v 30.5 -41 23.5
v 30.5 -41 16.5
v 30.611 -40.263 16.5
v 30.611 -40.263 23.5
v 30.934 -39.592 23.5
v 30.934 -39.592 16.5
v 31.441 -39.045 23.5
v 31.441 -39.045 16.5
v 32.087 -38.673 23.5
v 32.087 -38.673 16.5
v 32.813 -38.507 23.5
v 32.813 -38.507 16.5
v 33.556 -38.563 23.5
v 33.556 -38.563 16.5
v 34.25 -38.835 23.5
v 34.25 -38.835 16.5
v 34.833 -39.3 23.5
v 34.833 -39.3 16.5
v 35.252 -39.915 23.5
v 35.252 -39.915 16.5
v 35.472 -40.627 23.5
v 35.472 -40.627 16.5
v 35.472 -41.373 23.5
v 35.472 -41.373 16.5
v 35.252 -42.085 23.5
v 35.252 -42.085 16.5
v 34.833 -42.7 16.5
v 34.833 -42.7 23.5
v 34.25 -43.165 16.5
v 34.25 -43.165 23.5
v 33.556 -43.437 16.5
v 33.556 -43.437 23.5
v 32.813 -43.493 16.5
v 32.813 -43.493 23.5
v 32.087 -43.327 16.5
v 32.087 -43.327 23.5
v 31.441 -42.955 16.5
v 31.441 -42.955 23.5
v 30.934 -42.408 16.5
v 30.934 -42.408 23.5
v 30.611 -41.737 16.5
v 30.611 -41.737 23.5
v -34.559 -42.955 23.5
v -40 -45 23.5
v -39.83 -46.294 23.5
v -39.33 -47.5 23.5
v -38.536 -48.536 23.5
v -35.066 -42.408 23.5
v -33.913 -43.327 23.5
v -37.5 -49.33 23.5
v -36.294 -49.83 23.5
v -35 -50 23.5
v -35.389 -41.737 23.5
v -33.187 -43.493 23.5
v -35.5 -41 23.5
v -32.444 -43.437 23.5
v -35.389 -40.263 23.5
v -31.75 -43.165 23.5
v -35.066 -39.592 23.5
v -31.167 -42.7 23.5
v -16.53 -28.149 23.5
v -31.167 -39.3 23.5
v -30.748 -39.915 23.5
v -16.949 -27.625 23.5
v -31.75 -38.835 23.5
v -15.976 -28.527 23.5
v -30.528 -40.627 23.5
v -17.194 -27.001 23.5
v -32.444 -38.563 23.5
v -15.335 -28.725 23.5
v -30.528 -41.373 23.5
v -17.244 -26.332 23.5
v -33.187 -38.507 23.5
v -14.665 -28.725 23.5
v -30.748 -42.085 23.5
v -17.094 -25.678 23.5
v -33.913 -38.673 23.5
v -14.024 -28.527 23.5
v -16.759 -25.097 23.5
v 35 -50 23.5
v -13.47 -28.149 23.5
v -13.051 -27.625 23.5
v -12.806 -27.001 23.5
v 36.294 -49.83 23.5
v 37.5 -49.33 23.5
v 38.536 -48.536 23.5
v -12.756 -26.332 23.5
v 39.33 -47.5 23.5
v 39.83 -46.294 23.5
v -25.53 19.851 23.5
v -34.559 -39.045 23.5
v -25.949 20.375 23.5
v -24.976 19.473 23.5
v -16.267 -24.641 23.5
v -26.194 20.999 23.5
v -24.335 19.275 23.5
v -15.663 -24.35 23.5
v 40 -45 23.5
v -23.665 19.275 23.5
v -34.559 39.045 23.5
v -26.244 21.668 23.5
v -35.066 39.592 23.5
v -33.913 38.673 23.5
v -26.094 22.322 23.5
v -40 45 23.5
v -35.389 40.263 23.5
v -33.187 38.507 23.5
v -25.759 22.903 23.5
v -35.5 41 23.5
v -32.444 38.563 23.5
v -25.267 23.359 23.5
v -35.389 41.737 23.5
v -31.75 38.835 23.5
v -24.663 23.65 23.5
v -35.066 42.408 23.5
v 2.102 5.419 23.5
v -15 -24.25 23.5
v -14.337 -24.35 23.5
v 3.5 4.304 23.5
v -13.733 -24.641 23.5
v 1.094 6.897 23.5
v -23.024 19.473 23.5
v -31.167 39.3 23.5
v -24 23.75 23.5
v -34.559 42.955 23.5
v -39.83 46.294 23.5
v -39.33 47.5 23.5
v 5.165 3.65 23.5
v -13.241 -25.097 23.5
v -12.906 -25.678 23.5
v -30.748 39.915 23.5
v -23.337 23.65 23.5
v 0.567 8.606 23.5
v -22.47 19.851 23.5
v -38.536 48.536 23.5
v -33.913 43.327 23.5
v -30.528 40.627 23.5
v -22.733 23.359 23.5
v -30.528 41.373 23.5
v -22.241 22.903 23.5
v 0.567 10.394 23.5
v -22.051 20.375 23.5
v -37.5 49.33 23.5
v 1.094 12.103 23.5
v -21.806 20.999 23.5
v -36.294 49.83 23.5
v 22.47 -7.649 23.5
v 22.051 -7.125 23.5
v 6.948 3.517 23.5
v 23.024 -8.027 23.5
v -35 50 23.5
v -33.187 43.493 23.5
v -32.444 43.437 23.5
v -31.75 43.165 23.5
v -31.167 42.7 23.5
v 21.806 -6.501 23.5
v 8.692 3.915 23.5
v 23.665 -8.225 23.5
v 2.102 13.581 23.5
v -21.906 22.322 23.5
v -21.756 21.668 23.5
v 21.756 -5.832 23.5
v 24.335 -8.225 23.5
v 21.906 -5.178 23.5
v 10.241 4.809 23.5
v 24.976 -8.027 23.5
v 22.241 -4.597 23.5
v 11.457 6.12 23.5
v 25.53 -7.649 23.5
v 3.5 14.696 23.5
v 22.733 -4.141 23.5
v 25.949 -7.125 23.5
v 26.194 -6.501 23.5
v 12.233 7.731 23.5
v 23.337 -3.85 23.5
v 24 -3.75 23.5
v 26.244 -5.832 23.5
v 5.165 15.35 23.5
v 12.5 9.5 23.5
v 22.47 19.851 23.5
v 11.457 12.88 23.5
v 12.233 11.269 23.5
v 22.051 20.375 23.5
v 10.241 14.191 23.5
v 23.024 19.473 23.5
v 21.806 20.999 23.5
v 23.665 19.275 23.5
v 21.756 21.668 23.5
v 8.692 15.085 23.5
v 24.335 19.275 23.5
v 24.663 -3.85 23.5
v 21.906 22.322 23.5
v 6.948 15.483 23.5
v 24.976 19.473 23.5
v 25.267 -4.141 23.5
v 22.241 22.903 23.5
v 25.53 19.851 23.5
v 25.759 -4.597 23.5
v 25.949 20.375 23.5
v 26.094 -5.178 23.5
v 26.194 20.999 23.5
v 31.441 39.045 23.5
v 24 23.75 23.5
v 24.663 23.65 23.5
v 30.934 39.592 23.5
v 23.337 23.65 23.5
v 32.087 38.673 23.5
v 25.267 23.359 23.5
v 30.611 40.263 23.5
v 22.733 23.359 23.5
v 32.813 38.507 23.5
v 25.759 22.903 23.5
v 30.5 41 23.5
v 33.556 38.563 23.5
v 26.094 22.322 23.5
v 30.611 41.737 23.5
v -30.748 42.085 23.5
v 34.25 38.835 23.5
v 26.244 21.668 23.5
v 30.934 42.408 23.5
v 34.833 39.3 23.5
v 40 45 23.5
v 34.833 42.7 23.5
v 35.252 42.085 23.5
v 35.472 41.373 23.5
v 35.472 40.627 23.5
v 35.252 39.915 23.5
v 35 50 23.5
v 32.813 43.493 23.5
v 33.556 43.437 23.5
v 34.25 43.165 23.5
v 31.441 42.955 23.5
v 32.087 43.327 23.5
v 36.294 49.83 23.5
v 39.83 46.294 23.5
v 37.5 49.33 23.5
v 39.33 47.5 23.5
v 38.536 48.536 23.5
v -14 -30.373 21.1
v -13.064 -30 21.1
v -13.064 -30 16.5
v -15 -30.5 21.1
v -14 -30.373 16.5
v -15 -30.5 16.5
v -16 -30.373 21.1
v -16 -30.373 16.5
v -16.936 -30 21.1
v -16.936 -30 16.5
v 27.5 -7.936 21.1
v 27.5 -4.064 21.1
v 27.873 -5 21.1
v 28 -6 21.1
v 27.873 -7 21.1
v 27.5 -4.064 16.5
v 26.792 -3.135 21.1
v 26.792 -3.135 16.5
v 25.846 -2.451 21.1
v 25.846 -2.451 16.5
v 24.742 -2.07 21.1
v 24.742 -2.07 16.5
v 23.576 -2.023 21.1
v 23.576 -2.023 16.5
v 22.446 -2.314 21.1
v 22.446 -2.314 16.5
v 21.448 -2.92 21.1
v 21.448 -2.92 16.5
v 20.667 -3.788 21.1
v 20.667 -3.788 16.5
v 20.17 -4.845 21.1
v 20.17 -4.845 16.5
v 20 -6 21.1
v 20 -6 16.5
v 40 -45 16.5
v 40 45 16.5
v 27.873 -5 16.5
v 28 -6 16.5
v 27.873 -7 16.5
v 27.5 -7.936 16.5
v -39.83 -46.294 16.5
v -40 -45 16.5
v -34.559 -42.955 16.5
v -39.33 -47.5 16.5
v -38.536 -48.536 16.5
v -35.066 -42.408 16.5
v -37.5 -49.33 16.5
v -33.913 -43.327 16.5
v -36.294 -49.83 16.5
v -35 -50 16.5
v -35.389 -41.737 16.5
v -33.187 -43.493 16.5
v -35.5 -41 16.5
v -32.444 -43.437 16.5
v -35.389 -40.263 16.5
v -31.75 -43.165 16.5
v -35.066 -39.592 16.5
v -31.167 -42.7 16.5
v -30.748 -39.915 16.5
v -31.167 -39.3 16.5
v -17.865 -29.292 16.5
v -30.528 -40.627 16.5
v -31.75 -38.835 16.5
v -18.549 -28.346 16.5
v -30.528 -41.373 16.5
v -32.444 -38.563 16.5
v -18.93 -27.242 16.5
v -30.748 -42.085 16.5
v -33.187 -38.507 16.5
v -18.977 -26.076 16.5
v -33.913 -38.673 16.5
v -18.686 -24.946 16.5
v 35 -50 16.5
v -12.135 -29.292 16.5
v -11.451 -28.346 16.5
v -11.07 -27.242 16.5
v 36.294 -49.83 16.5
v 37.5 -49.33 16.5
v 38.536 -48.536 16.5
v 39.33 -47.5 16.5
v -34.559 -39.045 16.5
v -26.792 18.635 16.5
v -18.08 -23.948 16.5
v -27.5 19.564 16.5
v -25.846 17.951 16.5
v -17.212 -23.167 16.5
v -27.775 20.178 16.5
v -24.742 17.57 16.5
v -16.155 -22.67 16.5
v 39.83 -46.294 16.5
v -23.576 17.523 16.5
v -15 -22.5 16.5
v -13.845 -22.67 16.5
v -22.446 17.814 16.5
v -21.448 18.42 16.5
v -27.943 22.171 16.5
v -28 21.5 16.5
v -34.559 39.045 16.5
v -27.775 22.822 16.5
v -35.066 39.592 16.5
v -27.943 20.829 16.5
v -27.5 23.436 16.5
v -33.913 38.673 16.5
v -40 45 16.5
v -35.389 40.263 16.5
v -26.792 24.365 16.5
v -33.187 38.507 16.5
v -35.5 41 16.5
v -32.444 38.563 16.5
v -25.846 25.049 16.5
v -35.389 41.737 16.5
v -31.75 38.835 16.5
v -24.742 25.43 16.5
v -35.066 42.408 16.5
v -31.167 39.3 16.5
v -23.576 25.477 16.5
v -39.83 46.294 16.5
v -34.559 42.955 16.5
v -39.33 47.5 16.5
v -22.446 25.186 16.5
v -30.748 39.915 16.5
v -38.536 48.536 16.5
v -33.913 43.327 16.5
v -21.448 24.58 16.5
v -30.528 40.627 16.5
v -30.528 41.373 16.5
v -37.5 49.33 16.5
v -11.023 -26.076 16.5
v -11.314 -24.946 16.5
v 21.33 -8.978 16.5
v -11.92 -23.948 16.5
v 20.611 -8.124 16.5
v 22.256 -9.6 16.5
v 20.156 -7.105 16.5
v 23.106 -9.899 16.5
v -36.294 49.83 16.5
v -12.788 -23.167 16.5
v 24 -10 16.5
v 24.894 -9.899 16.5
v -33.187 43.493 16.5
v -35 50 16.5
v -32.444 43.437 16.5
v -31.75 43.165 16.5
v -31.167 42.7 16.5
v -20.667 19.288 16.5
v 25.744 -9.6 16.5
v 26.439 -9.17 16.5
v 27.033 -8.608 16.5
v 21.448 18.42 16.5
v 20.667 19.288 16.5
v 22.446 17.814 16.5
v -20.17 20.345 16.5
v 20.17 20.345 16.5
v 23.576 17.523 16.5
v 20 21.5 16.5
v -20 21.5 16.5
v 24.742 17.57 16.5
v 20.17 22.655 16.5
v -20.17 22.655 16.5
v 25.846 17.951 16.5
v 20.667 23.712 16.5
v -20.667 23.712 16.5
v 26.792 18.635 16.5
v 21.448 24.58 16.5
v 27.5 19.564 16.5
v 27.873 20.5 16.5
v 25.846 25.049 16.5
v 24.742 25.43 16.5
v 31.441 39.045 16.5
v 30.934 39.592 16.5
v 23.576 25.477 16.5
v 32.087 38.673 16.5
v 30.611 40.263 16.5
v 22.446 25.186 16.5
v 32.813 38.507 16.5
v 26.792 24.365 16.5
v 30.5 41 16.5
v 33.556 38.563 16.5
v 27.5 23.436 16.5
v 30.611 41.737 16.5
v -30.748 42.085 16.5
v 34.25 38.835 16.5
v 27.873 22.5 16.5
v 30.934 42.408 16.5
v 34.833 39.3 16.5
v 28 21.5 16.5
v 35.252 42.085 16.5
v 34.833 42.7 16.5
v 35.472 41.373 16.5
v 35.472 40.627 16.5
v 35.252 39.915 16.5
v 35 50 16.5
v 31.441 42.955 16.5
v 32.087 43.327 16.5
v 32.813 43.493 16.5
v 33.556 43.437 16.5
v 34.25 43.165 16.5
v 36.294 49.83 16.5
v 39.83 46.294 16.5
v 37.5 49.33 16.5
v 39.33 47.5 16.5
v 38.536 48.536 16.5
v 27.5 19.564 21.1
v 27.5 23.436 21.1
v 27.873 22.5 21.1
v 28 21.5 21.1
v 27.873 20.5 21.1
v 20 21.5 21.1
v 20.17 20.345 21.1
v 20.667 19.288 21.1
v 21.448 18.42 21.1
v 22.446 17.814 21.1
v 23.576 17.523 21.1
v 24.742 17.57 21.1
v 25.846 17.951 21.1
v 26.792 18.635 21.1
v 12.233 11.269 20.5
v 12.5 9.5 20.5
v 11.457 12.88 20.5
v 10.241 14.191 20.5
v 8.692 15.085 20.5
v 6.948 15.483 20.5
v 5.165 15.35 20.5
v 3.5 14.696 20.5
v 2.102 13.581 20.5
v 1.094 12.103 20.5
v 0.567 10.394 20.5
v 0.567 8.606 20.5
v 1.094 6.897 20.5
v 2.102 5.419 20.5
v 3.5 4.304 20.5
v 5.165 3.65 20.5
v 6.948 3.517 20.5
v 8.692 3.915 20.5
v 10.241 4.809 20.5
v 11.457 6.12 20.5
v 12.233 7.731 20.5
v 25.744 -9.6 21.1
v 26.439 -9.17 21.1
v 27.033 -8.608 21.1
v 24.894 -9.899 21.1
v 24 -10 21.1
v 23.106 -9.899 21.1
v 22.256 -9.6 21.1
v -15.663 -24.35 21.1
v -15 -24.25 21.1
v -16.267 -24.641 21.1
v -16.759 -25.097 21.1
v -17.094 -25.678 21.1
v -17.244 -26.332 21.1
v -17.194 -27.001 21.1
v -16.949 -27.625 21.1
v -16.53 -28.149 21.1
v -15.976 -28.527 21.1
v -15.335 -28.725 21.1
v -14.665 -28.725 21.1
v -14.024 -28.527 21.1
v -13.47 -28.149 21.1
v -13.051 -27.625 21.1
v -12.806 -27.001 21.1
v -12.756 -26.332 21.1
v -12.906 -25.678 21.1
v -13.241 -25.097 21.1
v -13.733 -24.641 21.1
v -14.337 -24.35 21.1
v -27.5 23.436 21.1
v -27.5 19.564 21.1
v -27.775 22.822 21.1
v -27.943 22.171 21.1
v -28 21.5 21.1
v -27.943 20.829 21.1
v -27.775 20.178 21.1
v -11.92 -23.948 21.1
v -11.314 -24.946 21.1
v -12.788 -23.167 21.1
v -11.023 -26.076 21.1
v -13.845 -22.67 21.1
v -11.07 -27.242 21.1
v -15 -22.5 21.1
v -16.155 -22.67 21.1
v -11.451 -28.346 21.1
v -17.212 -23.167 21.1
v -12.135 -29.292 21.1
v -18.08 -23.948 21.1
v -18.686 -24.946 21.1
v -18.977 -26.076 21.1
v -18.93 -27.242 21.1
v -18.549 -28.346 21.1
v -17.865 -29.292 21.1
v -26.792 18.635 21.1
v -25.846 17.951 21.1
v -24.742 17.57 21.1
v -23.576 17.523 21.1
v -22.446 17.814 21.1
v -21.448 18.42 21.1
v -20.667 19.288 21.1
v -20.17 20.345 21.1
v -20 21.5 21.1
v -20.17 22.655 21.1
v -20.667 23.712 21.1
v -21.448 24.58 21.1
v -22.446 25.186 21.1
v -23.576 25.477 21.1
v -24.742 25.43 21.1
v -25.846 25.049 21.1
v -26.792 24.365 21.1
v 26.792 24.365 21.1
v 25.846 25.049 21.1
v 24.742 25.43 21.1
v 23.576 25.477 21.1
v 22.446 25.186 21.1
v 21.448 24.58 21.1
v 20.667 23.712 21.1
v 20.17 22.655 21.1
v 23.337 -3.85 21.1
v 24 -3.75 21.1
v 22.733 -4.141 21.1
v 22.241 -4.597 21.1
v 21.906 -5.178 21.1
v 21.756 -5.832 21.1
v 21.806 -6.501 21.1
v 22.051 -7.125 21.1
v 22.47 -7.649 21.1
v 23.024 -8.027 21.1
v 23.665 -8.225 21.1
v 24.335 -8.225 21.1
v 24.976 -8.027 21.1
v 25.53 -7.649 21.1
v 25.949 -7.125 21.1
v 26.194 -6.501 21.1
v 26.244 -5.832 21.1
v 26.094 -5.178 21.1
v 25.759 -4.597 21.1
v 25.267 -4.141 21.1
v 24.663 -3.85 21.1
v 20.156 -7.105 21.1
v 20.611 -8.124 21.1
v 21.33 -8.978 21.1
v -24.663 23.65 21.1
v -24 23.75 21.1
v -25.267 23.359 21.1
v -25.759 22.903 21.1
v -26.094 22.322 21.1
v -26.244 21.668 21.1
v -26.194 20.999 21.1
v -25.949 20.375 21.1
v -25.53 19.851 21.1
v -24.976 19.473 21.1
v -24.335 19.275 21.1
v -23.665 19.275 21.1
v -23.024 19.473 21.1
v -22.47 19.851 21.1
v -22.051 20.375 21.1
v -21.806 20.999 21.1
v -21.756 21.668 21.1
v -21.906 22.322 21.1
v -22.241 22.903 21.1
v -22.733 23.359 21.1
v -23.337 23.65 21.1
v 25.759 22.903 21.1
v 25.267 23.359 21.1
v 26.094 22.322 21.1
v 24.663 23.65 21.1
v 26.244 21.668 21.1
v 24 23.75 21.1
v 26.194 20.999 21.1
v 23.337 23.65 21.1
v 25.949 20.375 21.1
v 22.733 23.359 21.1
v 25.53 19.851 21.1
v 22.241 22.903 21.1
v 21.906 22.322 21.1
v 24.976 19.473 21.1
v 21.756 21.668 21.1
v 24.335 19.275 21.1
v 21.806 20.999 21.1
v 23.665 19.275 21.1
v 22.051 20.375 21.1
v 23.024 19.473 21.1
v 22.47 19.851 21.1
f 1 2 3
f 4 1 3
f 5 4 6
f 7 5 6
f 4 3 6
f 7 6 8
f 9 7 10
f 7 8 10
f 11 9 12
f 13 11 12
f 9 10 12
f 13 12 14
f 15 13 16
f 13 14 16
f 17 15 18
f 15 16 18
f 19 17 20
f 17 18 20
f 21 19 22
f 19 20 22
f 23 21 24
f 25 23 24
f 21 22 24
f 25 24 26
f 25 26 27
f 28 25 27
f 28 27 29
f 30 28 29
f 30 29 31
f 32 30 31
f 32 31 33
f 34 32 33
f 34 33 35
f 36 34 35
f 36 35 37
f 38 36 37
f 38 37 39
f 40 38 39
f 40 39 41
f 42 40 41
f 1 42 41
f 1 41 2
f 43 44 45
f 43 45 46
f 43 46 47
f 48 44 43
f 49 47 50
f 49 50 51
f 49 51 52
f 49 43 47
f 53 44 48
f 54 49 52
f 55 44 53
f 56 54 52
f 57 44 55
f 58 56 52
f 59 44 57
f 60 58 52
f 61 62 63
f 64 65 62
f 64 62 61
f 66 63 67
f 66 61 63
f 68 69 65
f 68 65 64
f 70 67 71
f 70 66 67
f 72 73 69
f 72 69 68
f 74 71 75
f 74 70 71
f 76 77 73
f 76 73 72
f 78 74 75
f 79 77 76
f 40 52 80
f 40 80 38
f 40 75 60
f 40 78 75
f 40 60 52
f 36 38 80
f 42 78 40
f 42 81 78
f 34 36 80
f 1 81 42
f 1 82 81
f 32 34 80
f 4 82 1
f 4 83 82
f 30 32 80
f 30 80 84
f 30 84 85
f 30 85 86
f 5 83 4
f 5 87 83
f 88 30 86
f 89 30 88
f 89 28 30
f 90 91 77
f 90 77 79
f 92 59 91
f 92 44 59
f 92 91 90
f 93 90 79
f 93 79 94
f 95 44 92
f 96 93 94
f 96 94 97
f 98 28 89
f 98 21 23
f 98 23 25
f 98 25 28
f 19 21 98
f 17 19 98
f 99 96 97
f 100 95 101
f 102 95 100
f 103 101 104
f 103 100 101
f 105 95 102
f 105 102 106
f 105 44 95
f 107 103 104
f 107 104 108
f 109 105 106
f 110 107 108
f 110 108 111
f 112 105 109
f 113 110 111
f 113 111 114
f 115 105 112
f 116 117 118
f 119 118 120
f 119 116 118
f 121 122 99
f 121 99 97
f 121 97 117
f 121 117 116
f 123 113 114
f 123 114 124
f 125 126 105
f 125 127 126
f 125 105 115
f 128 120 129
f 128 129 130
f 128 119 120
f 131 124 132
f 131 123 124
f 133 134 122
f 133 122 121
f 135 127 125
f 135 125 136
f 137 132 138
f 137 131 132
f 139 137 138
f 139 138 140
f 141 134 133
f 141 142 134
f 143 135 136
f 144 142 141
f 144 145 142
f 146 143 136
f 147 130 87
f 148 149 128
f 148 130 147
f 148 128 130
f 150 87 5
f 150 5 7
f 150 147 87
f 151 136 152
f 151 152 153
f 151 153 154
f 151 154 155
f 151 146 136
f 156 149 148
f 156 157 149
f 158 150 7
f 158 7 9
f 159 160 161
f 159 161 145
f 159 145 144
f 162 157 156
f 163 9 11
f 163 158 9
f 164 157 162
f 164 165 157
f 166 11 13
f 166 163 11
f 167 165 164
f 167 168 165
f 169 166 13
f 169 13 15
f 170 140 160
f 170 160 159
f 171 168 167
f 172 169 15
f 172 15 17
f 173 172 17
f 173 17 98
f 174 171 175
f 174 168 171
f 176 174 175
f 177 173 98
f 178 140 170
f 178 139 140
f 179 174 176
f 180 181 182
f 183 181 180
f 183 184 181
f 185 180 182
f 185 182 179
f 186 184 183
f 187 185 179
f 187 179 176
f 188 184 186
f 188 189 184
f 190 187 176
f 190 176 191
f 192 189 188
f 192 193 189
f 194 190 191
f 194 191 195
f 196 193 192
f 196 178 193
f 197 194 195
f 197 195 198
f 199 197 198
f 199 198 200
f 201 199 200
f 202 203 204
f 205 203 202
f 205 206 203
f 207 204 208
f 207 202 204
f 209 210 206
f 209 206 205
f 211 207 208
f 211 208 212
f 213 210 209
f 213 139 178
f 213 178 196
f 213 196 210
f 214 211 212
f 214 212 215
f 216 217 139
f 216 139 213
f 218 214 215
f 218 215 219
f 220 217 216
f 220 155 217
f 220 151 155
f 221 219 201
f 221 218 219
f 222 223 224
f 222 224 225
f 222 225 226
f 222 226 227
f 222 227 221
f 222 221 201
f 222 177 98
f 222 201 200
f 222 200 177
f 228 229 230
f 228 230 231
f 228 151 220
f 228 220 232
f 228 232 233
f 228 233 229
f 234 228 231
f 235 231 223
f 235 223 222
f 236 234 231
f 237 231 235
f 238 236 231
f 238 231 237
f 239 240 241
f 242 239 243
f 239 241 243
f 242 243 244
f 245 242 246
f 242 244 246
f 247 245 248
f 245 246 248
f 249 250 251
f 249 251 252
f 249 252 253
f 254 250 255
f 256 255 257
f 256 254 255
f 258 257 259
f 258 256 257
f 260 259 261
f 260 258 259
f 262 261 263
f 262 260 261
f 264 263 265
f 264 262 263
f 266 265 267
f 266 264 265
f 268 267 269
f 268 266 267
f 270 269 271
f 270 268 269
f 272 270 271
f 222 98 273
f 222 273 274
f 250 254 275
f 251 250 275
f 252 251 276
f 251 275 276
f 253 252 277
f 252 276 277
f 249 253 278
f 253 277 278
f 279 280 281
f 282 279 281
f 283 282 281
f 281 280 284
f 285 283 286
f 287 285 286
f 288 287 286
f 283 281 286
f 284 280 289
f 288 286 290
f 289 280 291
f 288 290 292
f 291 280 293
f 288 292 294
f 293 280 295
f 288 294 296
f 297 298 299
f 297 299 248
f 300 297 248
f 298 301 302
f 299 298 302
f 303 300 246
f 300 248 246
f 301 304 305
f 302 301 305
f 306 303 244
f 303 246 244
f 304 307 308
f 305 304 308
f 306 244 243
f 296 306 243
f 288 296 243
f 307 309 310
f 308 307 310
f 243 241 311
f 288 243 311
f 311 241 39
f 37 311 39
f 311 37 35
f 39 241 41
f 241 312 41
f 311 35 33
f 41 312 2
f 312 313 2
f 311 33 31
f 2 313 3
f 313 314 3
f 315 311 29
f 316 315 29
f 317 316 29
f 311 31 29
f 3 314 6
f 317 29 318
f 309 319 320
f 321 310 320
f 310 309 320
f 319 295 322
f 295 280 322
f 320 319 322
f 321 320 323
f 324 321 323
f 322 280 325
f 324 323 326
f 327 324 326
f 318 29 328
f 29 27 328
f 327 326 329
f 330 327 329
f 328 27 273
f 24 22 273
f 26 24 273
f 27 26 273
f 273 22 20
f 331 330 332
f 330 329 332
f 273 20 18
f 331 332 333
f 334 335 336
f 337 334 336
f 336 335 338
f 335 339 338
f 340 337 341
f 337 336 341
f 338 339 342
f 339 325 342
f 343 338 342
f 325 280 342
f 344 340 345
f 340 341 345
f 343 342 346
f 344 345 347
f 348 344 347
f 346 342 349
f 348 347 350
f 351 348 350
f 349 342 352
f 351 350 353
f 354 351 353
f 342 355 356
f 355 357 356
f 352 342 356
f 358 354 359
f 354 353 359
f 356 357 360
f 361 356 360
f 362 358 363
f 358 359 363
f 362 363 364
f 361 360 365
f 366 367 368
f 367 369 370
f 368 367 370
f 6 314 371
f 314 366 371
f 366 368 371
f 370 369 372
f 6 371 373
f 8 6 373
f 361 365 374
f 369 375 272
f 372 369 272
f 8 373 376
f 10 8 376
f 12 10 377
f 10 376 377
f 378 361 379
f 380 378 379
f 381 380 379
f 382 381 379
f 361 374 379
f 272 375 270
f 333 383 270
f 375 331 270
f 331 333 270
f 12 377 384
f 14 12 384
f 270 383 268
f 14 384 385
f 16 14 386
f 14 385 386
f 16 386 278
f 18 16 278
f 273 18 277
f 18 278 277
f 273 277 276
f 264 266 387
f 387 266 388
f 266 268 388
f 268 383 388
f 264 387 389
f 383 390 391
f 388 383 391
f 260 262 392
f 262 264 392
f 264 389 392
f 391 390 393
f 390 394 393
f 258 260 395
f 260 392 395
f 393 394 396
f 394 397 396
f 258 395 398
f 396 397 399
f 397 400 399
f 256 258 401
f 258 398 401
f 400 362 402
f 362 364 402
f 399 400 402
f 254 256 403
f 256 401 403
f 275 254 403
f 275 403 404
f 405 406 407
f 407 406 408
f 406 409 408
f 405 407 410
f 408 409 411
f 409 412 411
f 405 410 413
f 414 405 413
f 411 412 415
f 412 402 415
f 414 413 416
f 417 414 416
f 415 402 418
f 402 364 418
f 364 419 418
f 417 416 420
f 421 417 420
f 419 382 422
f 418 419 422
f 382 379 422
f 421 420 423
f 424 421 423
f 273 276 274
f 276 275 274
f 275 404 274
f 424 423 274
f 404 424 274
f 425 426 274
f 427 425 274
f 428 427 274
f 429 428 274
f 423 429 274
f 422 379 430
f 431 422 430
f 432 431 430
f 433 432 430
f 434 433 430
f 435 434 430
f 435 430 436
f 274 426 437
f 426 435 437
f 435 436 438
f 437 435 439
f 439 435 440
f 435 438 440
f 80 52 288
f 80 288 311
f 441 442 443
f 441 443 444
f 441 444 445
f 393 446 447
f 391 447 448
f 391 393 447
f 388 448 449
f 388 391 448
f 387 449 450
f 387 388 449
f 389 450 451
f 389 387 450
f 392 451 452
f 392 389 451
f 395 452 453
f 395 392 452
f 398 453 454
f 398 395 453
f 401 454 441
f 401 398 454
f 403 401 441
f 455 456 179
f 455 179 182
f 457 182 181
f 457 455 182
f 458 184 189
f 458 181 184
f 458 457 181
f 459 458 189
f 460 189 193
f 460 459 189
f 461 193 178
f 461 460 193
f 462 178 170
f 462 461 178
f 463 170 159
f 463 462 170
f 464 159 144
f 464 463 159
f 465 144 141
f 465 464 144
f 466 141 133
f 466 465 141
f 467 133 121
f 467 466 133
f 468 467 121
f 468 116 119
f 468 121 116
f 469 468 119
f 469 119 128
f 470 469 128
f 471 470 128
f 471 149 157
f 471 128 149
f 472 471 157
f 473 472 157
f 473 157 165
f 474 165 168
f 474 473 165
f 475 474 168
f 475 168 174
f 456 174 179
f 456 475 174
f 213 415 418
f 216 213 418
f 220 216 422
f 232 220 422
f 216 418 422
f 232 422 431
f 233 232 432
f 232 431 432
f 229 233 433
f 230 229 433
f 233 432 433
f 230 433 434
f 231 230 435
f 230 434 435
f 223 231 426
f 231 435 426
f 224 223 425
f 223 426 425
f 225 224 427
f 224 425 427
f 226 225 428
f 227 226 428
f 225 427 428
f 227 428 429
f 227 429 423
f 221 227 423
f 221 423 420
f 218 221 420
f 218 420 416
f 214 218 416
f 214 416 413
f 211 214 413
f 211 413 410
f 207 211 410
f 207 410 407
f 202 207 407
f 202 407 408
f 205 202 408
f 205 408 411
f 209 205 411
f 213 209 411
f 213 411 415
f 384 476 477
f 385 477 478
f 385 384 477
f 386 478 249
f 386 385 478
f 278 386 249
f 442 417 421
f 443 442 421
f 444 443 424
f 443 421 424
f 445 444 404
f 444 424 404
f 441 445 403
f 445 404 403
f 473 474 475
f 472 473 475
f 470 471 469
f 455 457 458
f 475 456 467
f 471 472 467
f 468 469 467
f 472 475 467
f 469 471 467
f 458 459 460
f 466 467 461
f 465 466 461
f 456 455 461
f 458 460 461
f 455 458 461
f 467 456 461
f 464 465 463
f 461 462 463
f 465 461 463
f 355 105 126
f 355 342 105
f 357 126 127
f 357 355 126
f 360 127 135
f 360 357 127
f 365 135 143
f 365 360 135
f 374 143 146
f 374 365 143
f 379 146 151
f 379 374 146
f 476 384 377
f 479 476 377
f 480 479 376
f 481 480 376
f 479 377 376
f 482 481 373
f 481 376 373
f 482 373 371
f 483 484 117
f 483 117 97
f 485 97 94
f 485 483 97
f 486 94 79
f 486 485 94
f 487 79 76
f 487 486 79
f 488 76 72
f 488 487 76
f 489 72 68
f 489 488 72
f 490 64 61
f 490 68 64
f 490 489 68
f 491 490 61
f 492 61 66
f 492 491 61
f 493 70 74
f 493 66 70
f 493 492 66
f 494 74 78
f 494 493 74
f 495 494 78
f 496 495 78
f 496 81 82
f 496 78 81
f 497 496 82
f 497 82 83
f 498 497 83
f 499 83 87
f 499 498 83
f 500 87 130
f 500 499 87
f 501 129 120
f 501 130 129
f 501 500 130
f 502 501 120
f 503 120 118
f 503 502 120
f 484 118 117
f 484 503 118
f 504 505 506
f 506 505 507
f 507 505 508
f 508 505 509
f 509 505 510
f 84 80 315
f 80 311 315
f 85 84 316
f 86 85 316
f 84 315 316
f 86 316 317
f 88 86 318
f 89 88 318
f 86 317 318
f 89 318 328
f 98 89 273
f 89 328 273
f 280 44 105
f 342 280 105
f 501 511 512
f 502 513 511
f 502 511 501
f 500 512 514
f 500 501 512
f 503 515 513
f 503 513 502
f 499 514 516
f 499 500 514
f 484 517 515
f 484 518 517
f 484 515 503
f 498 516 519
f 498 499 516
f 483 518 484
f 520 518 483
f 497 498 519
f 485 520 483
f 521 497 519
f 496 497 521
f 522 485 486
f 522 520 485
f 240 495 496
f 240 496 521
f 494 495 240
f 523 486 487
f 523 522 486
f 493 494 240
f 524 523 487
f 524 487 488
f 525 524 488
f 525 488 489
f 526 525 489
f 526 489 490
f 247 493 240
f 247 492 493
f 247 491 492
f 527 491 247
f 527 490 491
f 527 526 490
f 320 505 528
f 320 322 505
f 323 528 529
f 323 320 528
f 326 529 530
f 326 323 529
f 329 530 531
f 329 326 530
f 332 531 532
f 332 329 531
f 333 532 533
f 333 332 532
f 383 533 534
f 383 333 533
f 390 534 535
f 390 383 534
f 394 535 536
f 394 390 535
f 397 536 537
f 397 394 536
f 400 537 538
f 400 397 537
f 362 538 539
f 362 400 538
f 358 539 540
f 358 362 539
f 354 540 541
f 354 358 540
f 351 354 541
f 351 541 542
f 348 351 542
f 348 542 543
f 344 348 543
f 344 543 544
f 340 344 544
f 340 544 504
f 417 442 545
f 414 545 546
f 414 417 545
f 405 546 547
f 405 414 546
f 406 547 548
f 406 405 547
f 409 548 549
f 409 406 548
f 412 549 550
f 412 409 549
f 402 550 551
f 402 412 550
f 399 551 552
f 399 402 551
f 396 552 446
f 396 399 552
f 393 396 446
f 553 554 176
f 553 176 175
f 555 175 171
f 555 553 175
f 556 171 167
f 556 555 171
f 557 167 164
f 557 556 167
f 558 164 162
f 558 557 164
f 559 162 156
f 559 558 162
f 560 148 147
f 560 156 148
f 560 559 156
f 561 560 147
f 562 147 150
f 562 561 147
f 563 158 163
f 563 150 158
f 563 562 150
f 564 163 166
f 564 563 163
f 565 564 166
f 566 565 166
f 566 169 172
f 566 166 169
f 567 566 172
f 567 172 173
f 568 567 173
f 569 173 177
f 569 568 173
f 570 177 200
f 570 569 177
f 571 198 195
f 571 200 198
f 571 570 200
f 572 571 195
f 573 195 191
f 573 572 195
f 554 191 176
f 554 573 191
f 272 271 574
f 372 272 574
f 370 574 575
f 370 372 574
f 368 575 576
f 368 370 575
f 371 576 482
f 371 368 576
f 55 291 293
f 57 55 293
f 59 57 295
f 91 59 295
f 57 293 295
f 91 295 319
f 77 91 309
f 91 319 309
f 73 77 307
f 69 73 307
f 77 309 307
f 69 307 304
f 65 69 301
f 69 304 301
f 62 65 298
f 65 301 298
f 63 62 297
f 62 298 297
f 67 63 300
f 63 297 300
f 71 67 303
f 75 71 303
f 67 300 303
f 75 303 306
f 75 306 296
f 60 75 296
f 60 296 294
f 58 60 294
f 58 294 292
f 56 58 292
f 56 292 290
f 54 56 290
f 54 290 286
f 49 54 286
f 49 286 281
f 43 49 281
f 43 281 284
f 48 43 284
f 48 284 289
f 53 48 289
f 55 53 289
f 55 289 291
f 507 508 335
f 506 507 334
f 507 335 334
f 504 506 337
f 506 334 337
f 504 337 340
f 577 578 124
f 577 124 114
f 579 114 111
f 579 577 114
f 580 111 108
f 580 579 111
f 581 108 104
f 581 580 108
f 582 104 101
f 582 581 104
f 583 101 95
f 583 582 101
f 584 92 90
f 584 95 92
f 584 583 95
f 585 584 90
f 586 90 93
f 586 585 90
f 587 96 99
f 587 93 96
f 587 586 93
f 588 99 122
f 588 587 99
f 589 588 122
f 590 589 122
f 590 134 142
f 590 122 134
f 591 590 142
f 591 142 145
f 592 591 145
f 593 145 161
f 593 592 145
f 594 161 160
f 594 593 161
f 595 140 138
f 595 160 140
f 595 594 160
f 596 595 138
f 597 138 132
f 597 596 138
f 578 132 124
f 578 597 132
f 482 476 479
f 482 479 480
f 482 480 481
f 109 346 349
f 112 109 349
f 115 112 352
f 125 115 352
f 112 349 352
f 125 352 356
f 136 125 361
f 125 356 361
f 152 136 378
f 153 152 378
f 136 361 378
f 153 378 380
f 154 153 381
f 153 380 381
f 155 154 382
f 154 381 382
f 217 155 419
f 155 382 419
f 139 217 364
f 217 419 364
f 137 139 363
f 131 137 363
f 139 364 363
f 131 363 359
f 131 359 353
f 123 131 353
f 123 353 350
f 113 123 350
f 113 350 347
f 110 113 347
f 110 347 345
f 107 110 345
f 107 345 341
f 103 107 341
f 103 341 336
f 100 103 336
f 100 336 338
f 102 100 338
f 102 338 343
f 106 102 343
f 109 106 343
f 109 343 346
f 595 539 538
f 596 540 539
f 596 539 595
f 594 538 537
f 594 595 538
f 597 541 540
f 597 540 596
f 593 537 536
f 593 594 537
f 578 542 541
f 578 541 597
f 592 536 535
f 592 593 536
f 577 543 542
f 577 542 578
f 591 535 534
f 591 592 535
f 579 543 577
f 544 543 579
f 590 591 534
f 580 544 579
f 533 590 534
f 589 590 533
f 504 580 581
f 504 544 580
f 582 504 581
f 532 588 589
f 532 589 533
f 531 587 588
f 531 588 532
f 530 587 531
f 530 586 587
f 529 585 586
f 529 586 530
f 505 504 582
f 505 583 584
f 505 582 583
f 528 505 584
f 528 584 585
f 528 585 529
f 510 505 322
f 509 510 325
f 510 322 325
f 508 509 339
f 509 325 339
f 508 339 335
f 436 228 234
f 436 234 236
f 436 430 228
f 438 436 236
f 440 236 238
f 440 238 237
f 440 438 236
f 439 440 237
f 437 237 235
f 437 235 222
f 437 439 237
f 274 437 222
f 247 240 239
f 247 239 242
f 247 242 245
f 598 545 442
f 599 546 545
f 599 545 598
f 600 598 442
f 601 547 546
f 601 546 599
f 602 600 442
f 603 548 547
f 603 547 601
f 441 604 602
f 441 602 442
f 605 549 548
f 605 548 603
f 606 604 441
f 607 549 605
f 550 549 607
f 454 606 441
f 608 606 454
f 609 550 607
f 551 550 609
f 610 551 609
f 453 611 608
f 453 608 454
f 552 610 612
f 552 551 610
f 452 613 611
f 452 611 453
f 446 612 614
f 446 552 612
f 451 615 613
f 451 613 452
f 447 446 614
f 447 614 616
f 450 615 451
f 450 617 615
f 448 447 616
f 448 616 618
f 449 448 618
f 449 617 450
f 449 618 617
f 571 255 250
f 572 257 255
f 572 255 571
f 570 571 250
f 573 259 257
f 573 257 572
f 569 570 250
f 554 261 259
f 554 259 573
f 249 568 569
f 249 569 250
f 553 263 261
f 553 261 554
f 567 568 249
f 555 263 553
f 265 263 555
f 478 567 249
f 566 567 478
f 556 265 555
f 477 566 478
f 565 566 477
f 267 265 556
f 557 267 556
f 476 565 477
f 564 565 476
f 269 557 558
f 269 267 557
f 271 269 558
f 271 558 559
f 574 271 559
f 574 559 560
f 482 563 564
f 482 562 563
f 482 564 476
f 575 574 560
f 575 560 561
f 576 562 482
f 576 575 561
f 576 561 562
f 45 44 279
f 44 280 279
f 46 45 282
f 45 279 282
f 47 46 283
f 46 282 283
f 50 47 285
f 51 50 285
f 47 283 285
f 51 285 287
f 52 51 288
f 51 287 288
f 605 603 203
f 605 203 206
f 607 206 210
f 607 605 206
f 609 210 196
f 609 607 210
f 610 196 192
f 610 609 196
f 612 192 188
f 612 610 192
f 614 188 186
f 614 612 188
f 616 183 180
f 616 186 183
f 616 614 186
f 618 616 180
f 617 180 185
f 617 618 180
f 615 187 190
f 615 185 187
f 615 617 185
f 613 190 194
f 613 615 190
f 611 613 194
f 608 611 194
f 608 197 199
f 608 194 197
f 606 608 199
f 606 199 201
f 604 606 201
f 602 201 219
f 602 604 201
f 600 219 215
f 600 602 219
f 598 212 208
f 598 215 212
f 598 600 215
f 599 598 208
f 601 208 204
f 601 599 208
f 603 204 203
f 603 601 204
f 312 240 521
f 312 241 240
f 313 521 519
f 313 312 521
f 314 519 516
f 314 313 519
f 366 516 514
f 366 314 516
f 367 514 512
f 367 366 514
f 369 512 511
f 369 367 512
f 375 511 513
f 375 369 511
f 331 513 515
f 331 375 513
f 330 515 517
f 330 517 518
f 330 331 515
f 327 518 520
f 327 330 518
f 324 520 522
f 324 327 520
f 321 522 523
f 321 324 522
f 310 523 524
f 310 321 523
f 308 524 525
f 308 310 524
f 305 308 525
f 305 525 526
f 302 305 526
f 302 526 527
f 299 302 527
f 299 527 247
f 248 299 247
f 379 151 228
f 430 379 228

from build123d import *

# Parameters (mm, degrees)
SKETCH_1_W                  = 55
SKETCH_1_H                  = 60
EXTRUDE_1_DEPTH             = 16.5
HOLE_WIZARD_3_6_3_6_1_D     = 3.6
HOLE_WIZARD_3_6_3_6_1_DEPTH = 25
HOLE_WIZARD_3_6_3_6_1_TIP   = 1.081549114
HOLE_WIZARD_M2_5_1_D        = 2.05
HOLE_WIZARD_M2_5_1_DEPTH    = 14
HOLE_WIZARD_M2_5_1_TIP      = 0.615882135
SKETCH_8_W                  = 35
SKETCH_8_H                  = 20.4
CUT_EXTRUDE_1_DEPTH         = 44.914690025
CUT_EXTRUDE_START           = 2.5
SKETCH_9_W                  = 20
SKETCH_9_H                  = 6
CUT_EXTRUDE_2_DEPTH         = 42.414690025
SHELL_START                 = 1.8
SHELL_1_DEPTH               = 14.7
EXTRUDE_2_DEPTH             = 7
SKETCH_16_R                 = 3
CUT_EXTRUDE_4_DEPTH         = 12
CUT_EXTRUDE_5_DEPTH         = 47.120928005
CUT_EXTRUDE_5_DEPTH_BACK    = 47.120928005
SKETCH_17_R                 = 6
FILLET_1_R                  = 0.5
FILLET_2_R                  = 0.5
HOLE_WIZARD_1_AT_2_COUNT    = 2
HOLE_WIZARD_1_AT_2_PITCH    = 27.5
HOLE_WIZARD_1_AT_3_COUNT    = 2
HOLE_WIZARD_1_AT_3_PITCH    = 61.846584384
HOLE_WIZARD_1_AT_4_COUNT    = 2
HOLE_WIZARD_1_AT_4_PITCH    = 48
SKETCH_21_W                 = 80
SKETCH_21_H                 = 100
EXTRUDE_3_DEPTH             = 7
HOLE_WIZARD_2_D             = 4.5
HOLE_WIZARD_2_CBORE_D       = 8
HOLE_WIZARD_2_CBORE_DEPTH   = 4.6
SKETCH_24_R                 = 8.656208536
EXTRUDE_4_DEPTH             = 4
FILLET_3_R                  = 5
HOLE_WIZARD_M6_2_D          = 5
HOLE_WIZARD_M6_2_DEPTH      = 15
HOLE_WIZARD_M6_2_TIP        = 1.502151548


# Read off the part's stored shape, not the designer's step: 抽壳1
with BuildPart() as part:
    # 草图1 → 凸台-拉伸1 (new body)
    with BuildSketch(Plane.XY):
        Rectangle(SKETCH_1_W, SKETCH_1_H)
    extrude(amount=EXTRUDE_1_DEPTH)

    # Ø3.6 (3.6) 直径孔1
    with Locations(Plane.XY.offset(16.5)):
        with Locations((-24, 21.5), (24, 21.5), (24, -6), (-15, -26.5)):
            Hole(HOLE_WIZARD_3_6_3_6_1_D / 2, depth=HOLE_WIZARD_3_6_3_6_1_DEPTH)
            with Locations((0, 0, -(HOLE_WIZARD_3_6_3_6_1_DEPTH + HOLE_WIZARD_3_6_3_6_1_TIP / 2))):  # 118° drill point
                Cone(0, HOLE_WIZARD_3_6_3_6_1_D / 2, HOLE_WIZARD_3_6_3_6_1_TIP, mode=Mode.SUBTRACT)

    # M2.5 螺纹孔1
    with Locations(Plane.XY.offset(16.5)):
        with Locations((-24, 26.5), (24, 26.5), (24, -1), (-22.5, -26.5)):
            Hole(HOLE_WIZARD_M2_5_1_D / 2, depth=HOLE_WIZARD_M2_5_1_DEPTH)
            with Locations((0, 0, -(HOLE_WIZARD_M2_5_1_DEPTH + HOLE_WIZARD_M2_5_1_TIP / 2))):  # 118° drill point
                Cone(0, HOLE_WIZARD_M2_5_1_D / 2, HOLE_WIZARD_M2_5_1_TIP, mode=Mode.SUBTRACT)

    # 草图8 → 切除-拉伸1 (cut, through all)
    with BuildSketch(Plane.XY.offset(16.5)):
        with Locations((10, -19.8)):
            Rectangle(SKETCH_8_W, SKETCH_8_H)
    extrude(amount=-CUT_EXTRUDE_1_DEPTH, mode=Mode.SUBTRACT)

    # 草图9 → 切除-拉伸2 (cut, through all)
    with BuildSketch(Plane(origin=(0, 0, 16.5), x_dir=(-1, 0, 0), z_dir=(0, 0, -1)).offset(CUT_EXTRUDE_START)):
        with Locations((17.5, -27)):
            Rectangle(SKETCH_9_W, SKETCH_9_H)
    extrude(amount=CUT_EXTRUDE_2_DEPTH, mode=Mode.SUBTRACT)

    # 抽壳1 outline → 抽壳1 (cut)
    with BuildSketch(Plane.XY.offset(SHELL_START)):
        with BuildLine():
            ThreePointArc((-21.743758657, 28.2), (-21.182110509, 26.299690696), (-22.006919283, 24.4979375))
            ThreePointArc((-22.006919283, 24.4979375), (-20.910890356, 19.651378458), (-25.7, 18.326673669))
            Line((-25.7, 18.326673669), (-25.7, -22.2))
            Line((-25.7, -22.2), (-9.3, -22.2))
            Line((-9.3, -22.2), (-9.3, -7.8))
            Line((-9.3, -7.8), (20.882308546, -7.8))
            ThreePointArc((20.882308546, -7.8), (20.494996561, -5.178446051), (22.006919283, -3.0020625))
            ThreePointArc((22.006919283, -3.0020625), (21.865811165, 0.8509087), (25.7, 1.256241343))
            Line((25.7, 1.256241343), (25.7, 18.326673669))
            ThreePointArc((25.7, 18.326673669), (20.910890356, 19.651378458), (22.006919283, 24.4979375))
            ThreePointArc((22.006919283, 24.4979375), (21.182110509, 26.299690696), (21.743758657, 28.2))
            Line((21.743758657, 28.2), (-21.743758657, 28.2))
        make_face()
    extrude(amount=SHELL_1_DEPTH, mode=Mode.SUBTRACT)

    # 草图16 → 切除-拉伸4 (cut)
    with BuildSketch(Plane(origin=(-7.5, 0, 0), x_dir=(0, 0, -1), z_dir=(1, 0, 0))):
        with Locations(Location((-8, -18, 0), (0, 0, 90))):
            Circle(SKETCH_16_R)
    extrude(amount=-CUT_EXTRUDE_4_DEPTH, mode=Mode.SUBTRACT)


with BuildPart() as body_2:
    # 草图10 → 凸台-拉伸2 (new body)
    with BuildSketch(Plane.XY.offset(16.5)):
        Polygon((-27.5, -30), (-7.5, -30), (-7.5, -9.6), (27.5, -9.6), (27.5, 30), (-27.5, 30), align=None)
    extrude(amount=EXTRUDE_2_DEPTH)


with BuildPart() as cut_extrude_5_tool:
    # 草图17 → 切除-拉伸5 (new, two sides: drawn at the far end of the back side and taken through both)
    with BuildSketch(Plane.XY.offset(1.8).offset(-CUT_EXTRUDE_5_DEPTH_BACK)):
        with Locations((6.5, 9.5)):
            Circle(SKETCH_17_R)
    extrude(amount=CUT_EXTRUDE_5_DEPTH + CUT_EXTRUDE_5_DEPTH_BACK)


with BuildPart() as part_1:
    add(part.part)

    # 切除-拉伸5: cut by cut_extrude_5_tool
    add(cut_extrude_5_tool.part, mode=Mode.SUBTRACT)

    # 圆角1
    fillet_1_edges = [part_1.edges().sort_by_distance(p)[0] for p in [
        (-27.5, 3, 0),
        (0, 30, 0),
        (27.5, 10.2, 0),
        (27.5, -9.6, 8.25),
        (-7.5, -16.8, 0),
        (10, -9.6, 0),
        (-7.5, -9.6, 8.25),
        (-7.5, -30, 15.25),
        (-27.5, -30, 15.25),
        (-27.5, 30, 8.25),
        (27.5, 30, 8.25),
        (-17.5, -24, 0),
        (-7.5, -24, 7),
        (-27.5, -24, 7),
    ]]
    fillet(fillet_1_edges, radius=FILLET_1_R)


with BuildPart() as body_2_1:
    add(body_2.part)

    # 切除-拉伸5: cut by cut_extrude_5_tool
    add(cut_extrude_5_tool.part, mode=Mode.SUBTRACT)

    # 圆角2
    fillet_2_edges = [body_2_1.edges().sort_by_distance(p)[0] for p in [
        (-27.5, 30, 20),
        (27.5, 30, 20),
        (27.5, -9.6, 20),
        (-7.5, -9.6, 20),
        (-7.5, -30, 20),
        (-27.5, -30, 20),
    ]]
    fillet(fillet_2_edges, radius=FILLET_2_R)

    # 草图20 → 打孔尺寸(%根据)内六角圆柱头螺钉的类型1 (revolve, cut)
    with BuildSketch(Plane(origin=(24, 21.5, 16.5), x_dir=(0, 1, 0), z_dir=(1, 0, 0))):
        Polygon((0, 0), (0, 7), (2.25, 7), (2.25, 4.6), (4, 4.6), (4, 0), align=None)
    hole_wizard_1 = revolve(axis=Axis((24, 21.5, 10.15), (0, 0, 1)), mode=Mode.SUBTRACT)

    # 打孔尺寸(%根据)内六角圆柱头螺钉的类型1 at 2: 打孔尺寸(%根据)内六角圆柱头螺钉的类型1 ×2
    with Locations(*[(0, -i * HOLE_WIZARD_1_AT_2_PITCH, 0) for i in range(1, HOLE_WIZARD_1_AT_2_COUNT)]):
        add(hole_wizard_1, mode=Mode.SUBTRACT)

    # 打孔尺寸(%根据)内六角圆柱头螺钉的类型1 at 3: 打孔尺寸(%根据)内六角圆柱头螺钉的类型1 ×2
    with Locations(*[Vector(-0.6305926250944656, -0.7761140001162656, 0) * (i * HOLE_WIZARD_1_AT_3_PITCH) for i in range(1, HOLE_WIZARD_1_AT_3_COUNT)]):
        add(hole_wizard_1, mode=Mode.SUBTRACT)

    # 打孔尺寸(%根据)内六角圆柱头螺钉的类型1 at 4: 打孔尺寸(%根据)内六角圆柱头螺钉的类型1 ×2
    with Locations(*[(-i * HOLE_WIZARD_1_AT_4_PITCH, 0, 0) for i in range(1, HOLE_WIZARD_1_AT_4_COUNT)]):
        add(hole_wizard_1, mode=Mode.SUBTRACT)

    # 草图21 → 凸台-拉伸3 (add)
    with BuildSketch(Plane.XY.offset(23.5)):
        Rectangle(SKETCH_21_W, SKETCH_21_H)
        with BuildLine():
            Line((-27, -30), (-8, -30))
            ThreePointArc((-8, -30), (-7.646446609, -29.853553391), (-7.5, -29.5))
            Line((-7.5, -29.5), (-7.5, -10.1))
            ThreePointArc((-7.5, -10.1), (-7.353553391, -9.746446609), (-7, -9.6))
            Line((-7, -9.6), (27, -9.6))
            ThreePointArc((27, -9.6), (27.353553391, -9.453553391), (27.5, -9.1))
            Line((27.5, -9.1), (27.5, 29.5))
            ThreePointArc((27.5, 29.5), (27.353553391, 29.853553391), (27, 30))
            Line((27, 30), (-27, 30))
            ThreePointArc((-27, 30), (-27.353553391, 29.853553391), (-27.5, 29.5))
            Line((-27.5, 29.5), (-27.5, -29.5))
            ThreePointArc((-27.5, -29.5), (-27.353553391, -29.853553391), (-27, -30))
        make_face(mode=Mode.SUBTRACT)
    extrude(amount=-EXTRUDE_3_DEPTH)

    # 打孔尺寸(%根据)内六角圆柱头螺钉的类型2 (through all)
    with Locations(Plane(origin=(0, 0, 16.5), x_dir=(-1, 0, 0), z_dir=(0, 0, -1))):
        with Locations((-24, 21.5), (-24, -6), (15, -26.5), (24, 21.5)):
            CounterBoreHole(HOLE_WIZARD_2_D / 2, HOLE_WIZARD_2_CBORE_D / 2, HOLE_WIZARD_2_CBORE_DEPTH)

    # 草图24 → 凸台-拉伸4 (add)
    with BuildSketch(Plane(origin=(0, 0, 16.5), x_dir=(-1, 0, 0), z_dir=(0, 0, -1))):
        with Locations((-6.5, 9.5)):
            Circle(SKETCH_24_R)
    extrude(amount=-EXTRUDE_4_DEPTH)

    # 圆角3
    fillet_3_edges = [body_2_1.edges().sort_by_distance(p)[0] for p in [
        (-40, 50, 20),
        (-40, -50, 20),
        (40, -50, 20),
        (40, 50, 20),
    ]]
    fillet(fillet_3_edges, radius=FILLET_3_R)

    # M6 螺纹孔2
    with Locations(Plane.XY.offset(23.5)):
        with Locations((33, 41), (-33, 41), (-33, -41), (33, -41)):
            Hole(HOLE_WIZARD_M6_2_D / 2, depth=HOLE_WIZARD_M6_2_DEPTH)
            with Locations((0, 0, -(HOLE_WIZARD_M6_2_DEPTH + HOLE_WIZARD_M6_2_TIP / 2))):  # 118° drill point
                Cone(0, HOLE_WIZARD_M6_2_D / 2, HOLE_WIZARD_M6_2_TIP, mode=Mode.SUBTRACT)


solid = body_2_1.part
